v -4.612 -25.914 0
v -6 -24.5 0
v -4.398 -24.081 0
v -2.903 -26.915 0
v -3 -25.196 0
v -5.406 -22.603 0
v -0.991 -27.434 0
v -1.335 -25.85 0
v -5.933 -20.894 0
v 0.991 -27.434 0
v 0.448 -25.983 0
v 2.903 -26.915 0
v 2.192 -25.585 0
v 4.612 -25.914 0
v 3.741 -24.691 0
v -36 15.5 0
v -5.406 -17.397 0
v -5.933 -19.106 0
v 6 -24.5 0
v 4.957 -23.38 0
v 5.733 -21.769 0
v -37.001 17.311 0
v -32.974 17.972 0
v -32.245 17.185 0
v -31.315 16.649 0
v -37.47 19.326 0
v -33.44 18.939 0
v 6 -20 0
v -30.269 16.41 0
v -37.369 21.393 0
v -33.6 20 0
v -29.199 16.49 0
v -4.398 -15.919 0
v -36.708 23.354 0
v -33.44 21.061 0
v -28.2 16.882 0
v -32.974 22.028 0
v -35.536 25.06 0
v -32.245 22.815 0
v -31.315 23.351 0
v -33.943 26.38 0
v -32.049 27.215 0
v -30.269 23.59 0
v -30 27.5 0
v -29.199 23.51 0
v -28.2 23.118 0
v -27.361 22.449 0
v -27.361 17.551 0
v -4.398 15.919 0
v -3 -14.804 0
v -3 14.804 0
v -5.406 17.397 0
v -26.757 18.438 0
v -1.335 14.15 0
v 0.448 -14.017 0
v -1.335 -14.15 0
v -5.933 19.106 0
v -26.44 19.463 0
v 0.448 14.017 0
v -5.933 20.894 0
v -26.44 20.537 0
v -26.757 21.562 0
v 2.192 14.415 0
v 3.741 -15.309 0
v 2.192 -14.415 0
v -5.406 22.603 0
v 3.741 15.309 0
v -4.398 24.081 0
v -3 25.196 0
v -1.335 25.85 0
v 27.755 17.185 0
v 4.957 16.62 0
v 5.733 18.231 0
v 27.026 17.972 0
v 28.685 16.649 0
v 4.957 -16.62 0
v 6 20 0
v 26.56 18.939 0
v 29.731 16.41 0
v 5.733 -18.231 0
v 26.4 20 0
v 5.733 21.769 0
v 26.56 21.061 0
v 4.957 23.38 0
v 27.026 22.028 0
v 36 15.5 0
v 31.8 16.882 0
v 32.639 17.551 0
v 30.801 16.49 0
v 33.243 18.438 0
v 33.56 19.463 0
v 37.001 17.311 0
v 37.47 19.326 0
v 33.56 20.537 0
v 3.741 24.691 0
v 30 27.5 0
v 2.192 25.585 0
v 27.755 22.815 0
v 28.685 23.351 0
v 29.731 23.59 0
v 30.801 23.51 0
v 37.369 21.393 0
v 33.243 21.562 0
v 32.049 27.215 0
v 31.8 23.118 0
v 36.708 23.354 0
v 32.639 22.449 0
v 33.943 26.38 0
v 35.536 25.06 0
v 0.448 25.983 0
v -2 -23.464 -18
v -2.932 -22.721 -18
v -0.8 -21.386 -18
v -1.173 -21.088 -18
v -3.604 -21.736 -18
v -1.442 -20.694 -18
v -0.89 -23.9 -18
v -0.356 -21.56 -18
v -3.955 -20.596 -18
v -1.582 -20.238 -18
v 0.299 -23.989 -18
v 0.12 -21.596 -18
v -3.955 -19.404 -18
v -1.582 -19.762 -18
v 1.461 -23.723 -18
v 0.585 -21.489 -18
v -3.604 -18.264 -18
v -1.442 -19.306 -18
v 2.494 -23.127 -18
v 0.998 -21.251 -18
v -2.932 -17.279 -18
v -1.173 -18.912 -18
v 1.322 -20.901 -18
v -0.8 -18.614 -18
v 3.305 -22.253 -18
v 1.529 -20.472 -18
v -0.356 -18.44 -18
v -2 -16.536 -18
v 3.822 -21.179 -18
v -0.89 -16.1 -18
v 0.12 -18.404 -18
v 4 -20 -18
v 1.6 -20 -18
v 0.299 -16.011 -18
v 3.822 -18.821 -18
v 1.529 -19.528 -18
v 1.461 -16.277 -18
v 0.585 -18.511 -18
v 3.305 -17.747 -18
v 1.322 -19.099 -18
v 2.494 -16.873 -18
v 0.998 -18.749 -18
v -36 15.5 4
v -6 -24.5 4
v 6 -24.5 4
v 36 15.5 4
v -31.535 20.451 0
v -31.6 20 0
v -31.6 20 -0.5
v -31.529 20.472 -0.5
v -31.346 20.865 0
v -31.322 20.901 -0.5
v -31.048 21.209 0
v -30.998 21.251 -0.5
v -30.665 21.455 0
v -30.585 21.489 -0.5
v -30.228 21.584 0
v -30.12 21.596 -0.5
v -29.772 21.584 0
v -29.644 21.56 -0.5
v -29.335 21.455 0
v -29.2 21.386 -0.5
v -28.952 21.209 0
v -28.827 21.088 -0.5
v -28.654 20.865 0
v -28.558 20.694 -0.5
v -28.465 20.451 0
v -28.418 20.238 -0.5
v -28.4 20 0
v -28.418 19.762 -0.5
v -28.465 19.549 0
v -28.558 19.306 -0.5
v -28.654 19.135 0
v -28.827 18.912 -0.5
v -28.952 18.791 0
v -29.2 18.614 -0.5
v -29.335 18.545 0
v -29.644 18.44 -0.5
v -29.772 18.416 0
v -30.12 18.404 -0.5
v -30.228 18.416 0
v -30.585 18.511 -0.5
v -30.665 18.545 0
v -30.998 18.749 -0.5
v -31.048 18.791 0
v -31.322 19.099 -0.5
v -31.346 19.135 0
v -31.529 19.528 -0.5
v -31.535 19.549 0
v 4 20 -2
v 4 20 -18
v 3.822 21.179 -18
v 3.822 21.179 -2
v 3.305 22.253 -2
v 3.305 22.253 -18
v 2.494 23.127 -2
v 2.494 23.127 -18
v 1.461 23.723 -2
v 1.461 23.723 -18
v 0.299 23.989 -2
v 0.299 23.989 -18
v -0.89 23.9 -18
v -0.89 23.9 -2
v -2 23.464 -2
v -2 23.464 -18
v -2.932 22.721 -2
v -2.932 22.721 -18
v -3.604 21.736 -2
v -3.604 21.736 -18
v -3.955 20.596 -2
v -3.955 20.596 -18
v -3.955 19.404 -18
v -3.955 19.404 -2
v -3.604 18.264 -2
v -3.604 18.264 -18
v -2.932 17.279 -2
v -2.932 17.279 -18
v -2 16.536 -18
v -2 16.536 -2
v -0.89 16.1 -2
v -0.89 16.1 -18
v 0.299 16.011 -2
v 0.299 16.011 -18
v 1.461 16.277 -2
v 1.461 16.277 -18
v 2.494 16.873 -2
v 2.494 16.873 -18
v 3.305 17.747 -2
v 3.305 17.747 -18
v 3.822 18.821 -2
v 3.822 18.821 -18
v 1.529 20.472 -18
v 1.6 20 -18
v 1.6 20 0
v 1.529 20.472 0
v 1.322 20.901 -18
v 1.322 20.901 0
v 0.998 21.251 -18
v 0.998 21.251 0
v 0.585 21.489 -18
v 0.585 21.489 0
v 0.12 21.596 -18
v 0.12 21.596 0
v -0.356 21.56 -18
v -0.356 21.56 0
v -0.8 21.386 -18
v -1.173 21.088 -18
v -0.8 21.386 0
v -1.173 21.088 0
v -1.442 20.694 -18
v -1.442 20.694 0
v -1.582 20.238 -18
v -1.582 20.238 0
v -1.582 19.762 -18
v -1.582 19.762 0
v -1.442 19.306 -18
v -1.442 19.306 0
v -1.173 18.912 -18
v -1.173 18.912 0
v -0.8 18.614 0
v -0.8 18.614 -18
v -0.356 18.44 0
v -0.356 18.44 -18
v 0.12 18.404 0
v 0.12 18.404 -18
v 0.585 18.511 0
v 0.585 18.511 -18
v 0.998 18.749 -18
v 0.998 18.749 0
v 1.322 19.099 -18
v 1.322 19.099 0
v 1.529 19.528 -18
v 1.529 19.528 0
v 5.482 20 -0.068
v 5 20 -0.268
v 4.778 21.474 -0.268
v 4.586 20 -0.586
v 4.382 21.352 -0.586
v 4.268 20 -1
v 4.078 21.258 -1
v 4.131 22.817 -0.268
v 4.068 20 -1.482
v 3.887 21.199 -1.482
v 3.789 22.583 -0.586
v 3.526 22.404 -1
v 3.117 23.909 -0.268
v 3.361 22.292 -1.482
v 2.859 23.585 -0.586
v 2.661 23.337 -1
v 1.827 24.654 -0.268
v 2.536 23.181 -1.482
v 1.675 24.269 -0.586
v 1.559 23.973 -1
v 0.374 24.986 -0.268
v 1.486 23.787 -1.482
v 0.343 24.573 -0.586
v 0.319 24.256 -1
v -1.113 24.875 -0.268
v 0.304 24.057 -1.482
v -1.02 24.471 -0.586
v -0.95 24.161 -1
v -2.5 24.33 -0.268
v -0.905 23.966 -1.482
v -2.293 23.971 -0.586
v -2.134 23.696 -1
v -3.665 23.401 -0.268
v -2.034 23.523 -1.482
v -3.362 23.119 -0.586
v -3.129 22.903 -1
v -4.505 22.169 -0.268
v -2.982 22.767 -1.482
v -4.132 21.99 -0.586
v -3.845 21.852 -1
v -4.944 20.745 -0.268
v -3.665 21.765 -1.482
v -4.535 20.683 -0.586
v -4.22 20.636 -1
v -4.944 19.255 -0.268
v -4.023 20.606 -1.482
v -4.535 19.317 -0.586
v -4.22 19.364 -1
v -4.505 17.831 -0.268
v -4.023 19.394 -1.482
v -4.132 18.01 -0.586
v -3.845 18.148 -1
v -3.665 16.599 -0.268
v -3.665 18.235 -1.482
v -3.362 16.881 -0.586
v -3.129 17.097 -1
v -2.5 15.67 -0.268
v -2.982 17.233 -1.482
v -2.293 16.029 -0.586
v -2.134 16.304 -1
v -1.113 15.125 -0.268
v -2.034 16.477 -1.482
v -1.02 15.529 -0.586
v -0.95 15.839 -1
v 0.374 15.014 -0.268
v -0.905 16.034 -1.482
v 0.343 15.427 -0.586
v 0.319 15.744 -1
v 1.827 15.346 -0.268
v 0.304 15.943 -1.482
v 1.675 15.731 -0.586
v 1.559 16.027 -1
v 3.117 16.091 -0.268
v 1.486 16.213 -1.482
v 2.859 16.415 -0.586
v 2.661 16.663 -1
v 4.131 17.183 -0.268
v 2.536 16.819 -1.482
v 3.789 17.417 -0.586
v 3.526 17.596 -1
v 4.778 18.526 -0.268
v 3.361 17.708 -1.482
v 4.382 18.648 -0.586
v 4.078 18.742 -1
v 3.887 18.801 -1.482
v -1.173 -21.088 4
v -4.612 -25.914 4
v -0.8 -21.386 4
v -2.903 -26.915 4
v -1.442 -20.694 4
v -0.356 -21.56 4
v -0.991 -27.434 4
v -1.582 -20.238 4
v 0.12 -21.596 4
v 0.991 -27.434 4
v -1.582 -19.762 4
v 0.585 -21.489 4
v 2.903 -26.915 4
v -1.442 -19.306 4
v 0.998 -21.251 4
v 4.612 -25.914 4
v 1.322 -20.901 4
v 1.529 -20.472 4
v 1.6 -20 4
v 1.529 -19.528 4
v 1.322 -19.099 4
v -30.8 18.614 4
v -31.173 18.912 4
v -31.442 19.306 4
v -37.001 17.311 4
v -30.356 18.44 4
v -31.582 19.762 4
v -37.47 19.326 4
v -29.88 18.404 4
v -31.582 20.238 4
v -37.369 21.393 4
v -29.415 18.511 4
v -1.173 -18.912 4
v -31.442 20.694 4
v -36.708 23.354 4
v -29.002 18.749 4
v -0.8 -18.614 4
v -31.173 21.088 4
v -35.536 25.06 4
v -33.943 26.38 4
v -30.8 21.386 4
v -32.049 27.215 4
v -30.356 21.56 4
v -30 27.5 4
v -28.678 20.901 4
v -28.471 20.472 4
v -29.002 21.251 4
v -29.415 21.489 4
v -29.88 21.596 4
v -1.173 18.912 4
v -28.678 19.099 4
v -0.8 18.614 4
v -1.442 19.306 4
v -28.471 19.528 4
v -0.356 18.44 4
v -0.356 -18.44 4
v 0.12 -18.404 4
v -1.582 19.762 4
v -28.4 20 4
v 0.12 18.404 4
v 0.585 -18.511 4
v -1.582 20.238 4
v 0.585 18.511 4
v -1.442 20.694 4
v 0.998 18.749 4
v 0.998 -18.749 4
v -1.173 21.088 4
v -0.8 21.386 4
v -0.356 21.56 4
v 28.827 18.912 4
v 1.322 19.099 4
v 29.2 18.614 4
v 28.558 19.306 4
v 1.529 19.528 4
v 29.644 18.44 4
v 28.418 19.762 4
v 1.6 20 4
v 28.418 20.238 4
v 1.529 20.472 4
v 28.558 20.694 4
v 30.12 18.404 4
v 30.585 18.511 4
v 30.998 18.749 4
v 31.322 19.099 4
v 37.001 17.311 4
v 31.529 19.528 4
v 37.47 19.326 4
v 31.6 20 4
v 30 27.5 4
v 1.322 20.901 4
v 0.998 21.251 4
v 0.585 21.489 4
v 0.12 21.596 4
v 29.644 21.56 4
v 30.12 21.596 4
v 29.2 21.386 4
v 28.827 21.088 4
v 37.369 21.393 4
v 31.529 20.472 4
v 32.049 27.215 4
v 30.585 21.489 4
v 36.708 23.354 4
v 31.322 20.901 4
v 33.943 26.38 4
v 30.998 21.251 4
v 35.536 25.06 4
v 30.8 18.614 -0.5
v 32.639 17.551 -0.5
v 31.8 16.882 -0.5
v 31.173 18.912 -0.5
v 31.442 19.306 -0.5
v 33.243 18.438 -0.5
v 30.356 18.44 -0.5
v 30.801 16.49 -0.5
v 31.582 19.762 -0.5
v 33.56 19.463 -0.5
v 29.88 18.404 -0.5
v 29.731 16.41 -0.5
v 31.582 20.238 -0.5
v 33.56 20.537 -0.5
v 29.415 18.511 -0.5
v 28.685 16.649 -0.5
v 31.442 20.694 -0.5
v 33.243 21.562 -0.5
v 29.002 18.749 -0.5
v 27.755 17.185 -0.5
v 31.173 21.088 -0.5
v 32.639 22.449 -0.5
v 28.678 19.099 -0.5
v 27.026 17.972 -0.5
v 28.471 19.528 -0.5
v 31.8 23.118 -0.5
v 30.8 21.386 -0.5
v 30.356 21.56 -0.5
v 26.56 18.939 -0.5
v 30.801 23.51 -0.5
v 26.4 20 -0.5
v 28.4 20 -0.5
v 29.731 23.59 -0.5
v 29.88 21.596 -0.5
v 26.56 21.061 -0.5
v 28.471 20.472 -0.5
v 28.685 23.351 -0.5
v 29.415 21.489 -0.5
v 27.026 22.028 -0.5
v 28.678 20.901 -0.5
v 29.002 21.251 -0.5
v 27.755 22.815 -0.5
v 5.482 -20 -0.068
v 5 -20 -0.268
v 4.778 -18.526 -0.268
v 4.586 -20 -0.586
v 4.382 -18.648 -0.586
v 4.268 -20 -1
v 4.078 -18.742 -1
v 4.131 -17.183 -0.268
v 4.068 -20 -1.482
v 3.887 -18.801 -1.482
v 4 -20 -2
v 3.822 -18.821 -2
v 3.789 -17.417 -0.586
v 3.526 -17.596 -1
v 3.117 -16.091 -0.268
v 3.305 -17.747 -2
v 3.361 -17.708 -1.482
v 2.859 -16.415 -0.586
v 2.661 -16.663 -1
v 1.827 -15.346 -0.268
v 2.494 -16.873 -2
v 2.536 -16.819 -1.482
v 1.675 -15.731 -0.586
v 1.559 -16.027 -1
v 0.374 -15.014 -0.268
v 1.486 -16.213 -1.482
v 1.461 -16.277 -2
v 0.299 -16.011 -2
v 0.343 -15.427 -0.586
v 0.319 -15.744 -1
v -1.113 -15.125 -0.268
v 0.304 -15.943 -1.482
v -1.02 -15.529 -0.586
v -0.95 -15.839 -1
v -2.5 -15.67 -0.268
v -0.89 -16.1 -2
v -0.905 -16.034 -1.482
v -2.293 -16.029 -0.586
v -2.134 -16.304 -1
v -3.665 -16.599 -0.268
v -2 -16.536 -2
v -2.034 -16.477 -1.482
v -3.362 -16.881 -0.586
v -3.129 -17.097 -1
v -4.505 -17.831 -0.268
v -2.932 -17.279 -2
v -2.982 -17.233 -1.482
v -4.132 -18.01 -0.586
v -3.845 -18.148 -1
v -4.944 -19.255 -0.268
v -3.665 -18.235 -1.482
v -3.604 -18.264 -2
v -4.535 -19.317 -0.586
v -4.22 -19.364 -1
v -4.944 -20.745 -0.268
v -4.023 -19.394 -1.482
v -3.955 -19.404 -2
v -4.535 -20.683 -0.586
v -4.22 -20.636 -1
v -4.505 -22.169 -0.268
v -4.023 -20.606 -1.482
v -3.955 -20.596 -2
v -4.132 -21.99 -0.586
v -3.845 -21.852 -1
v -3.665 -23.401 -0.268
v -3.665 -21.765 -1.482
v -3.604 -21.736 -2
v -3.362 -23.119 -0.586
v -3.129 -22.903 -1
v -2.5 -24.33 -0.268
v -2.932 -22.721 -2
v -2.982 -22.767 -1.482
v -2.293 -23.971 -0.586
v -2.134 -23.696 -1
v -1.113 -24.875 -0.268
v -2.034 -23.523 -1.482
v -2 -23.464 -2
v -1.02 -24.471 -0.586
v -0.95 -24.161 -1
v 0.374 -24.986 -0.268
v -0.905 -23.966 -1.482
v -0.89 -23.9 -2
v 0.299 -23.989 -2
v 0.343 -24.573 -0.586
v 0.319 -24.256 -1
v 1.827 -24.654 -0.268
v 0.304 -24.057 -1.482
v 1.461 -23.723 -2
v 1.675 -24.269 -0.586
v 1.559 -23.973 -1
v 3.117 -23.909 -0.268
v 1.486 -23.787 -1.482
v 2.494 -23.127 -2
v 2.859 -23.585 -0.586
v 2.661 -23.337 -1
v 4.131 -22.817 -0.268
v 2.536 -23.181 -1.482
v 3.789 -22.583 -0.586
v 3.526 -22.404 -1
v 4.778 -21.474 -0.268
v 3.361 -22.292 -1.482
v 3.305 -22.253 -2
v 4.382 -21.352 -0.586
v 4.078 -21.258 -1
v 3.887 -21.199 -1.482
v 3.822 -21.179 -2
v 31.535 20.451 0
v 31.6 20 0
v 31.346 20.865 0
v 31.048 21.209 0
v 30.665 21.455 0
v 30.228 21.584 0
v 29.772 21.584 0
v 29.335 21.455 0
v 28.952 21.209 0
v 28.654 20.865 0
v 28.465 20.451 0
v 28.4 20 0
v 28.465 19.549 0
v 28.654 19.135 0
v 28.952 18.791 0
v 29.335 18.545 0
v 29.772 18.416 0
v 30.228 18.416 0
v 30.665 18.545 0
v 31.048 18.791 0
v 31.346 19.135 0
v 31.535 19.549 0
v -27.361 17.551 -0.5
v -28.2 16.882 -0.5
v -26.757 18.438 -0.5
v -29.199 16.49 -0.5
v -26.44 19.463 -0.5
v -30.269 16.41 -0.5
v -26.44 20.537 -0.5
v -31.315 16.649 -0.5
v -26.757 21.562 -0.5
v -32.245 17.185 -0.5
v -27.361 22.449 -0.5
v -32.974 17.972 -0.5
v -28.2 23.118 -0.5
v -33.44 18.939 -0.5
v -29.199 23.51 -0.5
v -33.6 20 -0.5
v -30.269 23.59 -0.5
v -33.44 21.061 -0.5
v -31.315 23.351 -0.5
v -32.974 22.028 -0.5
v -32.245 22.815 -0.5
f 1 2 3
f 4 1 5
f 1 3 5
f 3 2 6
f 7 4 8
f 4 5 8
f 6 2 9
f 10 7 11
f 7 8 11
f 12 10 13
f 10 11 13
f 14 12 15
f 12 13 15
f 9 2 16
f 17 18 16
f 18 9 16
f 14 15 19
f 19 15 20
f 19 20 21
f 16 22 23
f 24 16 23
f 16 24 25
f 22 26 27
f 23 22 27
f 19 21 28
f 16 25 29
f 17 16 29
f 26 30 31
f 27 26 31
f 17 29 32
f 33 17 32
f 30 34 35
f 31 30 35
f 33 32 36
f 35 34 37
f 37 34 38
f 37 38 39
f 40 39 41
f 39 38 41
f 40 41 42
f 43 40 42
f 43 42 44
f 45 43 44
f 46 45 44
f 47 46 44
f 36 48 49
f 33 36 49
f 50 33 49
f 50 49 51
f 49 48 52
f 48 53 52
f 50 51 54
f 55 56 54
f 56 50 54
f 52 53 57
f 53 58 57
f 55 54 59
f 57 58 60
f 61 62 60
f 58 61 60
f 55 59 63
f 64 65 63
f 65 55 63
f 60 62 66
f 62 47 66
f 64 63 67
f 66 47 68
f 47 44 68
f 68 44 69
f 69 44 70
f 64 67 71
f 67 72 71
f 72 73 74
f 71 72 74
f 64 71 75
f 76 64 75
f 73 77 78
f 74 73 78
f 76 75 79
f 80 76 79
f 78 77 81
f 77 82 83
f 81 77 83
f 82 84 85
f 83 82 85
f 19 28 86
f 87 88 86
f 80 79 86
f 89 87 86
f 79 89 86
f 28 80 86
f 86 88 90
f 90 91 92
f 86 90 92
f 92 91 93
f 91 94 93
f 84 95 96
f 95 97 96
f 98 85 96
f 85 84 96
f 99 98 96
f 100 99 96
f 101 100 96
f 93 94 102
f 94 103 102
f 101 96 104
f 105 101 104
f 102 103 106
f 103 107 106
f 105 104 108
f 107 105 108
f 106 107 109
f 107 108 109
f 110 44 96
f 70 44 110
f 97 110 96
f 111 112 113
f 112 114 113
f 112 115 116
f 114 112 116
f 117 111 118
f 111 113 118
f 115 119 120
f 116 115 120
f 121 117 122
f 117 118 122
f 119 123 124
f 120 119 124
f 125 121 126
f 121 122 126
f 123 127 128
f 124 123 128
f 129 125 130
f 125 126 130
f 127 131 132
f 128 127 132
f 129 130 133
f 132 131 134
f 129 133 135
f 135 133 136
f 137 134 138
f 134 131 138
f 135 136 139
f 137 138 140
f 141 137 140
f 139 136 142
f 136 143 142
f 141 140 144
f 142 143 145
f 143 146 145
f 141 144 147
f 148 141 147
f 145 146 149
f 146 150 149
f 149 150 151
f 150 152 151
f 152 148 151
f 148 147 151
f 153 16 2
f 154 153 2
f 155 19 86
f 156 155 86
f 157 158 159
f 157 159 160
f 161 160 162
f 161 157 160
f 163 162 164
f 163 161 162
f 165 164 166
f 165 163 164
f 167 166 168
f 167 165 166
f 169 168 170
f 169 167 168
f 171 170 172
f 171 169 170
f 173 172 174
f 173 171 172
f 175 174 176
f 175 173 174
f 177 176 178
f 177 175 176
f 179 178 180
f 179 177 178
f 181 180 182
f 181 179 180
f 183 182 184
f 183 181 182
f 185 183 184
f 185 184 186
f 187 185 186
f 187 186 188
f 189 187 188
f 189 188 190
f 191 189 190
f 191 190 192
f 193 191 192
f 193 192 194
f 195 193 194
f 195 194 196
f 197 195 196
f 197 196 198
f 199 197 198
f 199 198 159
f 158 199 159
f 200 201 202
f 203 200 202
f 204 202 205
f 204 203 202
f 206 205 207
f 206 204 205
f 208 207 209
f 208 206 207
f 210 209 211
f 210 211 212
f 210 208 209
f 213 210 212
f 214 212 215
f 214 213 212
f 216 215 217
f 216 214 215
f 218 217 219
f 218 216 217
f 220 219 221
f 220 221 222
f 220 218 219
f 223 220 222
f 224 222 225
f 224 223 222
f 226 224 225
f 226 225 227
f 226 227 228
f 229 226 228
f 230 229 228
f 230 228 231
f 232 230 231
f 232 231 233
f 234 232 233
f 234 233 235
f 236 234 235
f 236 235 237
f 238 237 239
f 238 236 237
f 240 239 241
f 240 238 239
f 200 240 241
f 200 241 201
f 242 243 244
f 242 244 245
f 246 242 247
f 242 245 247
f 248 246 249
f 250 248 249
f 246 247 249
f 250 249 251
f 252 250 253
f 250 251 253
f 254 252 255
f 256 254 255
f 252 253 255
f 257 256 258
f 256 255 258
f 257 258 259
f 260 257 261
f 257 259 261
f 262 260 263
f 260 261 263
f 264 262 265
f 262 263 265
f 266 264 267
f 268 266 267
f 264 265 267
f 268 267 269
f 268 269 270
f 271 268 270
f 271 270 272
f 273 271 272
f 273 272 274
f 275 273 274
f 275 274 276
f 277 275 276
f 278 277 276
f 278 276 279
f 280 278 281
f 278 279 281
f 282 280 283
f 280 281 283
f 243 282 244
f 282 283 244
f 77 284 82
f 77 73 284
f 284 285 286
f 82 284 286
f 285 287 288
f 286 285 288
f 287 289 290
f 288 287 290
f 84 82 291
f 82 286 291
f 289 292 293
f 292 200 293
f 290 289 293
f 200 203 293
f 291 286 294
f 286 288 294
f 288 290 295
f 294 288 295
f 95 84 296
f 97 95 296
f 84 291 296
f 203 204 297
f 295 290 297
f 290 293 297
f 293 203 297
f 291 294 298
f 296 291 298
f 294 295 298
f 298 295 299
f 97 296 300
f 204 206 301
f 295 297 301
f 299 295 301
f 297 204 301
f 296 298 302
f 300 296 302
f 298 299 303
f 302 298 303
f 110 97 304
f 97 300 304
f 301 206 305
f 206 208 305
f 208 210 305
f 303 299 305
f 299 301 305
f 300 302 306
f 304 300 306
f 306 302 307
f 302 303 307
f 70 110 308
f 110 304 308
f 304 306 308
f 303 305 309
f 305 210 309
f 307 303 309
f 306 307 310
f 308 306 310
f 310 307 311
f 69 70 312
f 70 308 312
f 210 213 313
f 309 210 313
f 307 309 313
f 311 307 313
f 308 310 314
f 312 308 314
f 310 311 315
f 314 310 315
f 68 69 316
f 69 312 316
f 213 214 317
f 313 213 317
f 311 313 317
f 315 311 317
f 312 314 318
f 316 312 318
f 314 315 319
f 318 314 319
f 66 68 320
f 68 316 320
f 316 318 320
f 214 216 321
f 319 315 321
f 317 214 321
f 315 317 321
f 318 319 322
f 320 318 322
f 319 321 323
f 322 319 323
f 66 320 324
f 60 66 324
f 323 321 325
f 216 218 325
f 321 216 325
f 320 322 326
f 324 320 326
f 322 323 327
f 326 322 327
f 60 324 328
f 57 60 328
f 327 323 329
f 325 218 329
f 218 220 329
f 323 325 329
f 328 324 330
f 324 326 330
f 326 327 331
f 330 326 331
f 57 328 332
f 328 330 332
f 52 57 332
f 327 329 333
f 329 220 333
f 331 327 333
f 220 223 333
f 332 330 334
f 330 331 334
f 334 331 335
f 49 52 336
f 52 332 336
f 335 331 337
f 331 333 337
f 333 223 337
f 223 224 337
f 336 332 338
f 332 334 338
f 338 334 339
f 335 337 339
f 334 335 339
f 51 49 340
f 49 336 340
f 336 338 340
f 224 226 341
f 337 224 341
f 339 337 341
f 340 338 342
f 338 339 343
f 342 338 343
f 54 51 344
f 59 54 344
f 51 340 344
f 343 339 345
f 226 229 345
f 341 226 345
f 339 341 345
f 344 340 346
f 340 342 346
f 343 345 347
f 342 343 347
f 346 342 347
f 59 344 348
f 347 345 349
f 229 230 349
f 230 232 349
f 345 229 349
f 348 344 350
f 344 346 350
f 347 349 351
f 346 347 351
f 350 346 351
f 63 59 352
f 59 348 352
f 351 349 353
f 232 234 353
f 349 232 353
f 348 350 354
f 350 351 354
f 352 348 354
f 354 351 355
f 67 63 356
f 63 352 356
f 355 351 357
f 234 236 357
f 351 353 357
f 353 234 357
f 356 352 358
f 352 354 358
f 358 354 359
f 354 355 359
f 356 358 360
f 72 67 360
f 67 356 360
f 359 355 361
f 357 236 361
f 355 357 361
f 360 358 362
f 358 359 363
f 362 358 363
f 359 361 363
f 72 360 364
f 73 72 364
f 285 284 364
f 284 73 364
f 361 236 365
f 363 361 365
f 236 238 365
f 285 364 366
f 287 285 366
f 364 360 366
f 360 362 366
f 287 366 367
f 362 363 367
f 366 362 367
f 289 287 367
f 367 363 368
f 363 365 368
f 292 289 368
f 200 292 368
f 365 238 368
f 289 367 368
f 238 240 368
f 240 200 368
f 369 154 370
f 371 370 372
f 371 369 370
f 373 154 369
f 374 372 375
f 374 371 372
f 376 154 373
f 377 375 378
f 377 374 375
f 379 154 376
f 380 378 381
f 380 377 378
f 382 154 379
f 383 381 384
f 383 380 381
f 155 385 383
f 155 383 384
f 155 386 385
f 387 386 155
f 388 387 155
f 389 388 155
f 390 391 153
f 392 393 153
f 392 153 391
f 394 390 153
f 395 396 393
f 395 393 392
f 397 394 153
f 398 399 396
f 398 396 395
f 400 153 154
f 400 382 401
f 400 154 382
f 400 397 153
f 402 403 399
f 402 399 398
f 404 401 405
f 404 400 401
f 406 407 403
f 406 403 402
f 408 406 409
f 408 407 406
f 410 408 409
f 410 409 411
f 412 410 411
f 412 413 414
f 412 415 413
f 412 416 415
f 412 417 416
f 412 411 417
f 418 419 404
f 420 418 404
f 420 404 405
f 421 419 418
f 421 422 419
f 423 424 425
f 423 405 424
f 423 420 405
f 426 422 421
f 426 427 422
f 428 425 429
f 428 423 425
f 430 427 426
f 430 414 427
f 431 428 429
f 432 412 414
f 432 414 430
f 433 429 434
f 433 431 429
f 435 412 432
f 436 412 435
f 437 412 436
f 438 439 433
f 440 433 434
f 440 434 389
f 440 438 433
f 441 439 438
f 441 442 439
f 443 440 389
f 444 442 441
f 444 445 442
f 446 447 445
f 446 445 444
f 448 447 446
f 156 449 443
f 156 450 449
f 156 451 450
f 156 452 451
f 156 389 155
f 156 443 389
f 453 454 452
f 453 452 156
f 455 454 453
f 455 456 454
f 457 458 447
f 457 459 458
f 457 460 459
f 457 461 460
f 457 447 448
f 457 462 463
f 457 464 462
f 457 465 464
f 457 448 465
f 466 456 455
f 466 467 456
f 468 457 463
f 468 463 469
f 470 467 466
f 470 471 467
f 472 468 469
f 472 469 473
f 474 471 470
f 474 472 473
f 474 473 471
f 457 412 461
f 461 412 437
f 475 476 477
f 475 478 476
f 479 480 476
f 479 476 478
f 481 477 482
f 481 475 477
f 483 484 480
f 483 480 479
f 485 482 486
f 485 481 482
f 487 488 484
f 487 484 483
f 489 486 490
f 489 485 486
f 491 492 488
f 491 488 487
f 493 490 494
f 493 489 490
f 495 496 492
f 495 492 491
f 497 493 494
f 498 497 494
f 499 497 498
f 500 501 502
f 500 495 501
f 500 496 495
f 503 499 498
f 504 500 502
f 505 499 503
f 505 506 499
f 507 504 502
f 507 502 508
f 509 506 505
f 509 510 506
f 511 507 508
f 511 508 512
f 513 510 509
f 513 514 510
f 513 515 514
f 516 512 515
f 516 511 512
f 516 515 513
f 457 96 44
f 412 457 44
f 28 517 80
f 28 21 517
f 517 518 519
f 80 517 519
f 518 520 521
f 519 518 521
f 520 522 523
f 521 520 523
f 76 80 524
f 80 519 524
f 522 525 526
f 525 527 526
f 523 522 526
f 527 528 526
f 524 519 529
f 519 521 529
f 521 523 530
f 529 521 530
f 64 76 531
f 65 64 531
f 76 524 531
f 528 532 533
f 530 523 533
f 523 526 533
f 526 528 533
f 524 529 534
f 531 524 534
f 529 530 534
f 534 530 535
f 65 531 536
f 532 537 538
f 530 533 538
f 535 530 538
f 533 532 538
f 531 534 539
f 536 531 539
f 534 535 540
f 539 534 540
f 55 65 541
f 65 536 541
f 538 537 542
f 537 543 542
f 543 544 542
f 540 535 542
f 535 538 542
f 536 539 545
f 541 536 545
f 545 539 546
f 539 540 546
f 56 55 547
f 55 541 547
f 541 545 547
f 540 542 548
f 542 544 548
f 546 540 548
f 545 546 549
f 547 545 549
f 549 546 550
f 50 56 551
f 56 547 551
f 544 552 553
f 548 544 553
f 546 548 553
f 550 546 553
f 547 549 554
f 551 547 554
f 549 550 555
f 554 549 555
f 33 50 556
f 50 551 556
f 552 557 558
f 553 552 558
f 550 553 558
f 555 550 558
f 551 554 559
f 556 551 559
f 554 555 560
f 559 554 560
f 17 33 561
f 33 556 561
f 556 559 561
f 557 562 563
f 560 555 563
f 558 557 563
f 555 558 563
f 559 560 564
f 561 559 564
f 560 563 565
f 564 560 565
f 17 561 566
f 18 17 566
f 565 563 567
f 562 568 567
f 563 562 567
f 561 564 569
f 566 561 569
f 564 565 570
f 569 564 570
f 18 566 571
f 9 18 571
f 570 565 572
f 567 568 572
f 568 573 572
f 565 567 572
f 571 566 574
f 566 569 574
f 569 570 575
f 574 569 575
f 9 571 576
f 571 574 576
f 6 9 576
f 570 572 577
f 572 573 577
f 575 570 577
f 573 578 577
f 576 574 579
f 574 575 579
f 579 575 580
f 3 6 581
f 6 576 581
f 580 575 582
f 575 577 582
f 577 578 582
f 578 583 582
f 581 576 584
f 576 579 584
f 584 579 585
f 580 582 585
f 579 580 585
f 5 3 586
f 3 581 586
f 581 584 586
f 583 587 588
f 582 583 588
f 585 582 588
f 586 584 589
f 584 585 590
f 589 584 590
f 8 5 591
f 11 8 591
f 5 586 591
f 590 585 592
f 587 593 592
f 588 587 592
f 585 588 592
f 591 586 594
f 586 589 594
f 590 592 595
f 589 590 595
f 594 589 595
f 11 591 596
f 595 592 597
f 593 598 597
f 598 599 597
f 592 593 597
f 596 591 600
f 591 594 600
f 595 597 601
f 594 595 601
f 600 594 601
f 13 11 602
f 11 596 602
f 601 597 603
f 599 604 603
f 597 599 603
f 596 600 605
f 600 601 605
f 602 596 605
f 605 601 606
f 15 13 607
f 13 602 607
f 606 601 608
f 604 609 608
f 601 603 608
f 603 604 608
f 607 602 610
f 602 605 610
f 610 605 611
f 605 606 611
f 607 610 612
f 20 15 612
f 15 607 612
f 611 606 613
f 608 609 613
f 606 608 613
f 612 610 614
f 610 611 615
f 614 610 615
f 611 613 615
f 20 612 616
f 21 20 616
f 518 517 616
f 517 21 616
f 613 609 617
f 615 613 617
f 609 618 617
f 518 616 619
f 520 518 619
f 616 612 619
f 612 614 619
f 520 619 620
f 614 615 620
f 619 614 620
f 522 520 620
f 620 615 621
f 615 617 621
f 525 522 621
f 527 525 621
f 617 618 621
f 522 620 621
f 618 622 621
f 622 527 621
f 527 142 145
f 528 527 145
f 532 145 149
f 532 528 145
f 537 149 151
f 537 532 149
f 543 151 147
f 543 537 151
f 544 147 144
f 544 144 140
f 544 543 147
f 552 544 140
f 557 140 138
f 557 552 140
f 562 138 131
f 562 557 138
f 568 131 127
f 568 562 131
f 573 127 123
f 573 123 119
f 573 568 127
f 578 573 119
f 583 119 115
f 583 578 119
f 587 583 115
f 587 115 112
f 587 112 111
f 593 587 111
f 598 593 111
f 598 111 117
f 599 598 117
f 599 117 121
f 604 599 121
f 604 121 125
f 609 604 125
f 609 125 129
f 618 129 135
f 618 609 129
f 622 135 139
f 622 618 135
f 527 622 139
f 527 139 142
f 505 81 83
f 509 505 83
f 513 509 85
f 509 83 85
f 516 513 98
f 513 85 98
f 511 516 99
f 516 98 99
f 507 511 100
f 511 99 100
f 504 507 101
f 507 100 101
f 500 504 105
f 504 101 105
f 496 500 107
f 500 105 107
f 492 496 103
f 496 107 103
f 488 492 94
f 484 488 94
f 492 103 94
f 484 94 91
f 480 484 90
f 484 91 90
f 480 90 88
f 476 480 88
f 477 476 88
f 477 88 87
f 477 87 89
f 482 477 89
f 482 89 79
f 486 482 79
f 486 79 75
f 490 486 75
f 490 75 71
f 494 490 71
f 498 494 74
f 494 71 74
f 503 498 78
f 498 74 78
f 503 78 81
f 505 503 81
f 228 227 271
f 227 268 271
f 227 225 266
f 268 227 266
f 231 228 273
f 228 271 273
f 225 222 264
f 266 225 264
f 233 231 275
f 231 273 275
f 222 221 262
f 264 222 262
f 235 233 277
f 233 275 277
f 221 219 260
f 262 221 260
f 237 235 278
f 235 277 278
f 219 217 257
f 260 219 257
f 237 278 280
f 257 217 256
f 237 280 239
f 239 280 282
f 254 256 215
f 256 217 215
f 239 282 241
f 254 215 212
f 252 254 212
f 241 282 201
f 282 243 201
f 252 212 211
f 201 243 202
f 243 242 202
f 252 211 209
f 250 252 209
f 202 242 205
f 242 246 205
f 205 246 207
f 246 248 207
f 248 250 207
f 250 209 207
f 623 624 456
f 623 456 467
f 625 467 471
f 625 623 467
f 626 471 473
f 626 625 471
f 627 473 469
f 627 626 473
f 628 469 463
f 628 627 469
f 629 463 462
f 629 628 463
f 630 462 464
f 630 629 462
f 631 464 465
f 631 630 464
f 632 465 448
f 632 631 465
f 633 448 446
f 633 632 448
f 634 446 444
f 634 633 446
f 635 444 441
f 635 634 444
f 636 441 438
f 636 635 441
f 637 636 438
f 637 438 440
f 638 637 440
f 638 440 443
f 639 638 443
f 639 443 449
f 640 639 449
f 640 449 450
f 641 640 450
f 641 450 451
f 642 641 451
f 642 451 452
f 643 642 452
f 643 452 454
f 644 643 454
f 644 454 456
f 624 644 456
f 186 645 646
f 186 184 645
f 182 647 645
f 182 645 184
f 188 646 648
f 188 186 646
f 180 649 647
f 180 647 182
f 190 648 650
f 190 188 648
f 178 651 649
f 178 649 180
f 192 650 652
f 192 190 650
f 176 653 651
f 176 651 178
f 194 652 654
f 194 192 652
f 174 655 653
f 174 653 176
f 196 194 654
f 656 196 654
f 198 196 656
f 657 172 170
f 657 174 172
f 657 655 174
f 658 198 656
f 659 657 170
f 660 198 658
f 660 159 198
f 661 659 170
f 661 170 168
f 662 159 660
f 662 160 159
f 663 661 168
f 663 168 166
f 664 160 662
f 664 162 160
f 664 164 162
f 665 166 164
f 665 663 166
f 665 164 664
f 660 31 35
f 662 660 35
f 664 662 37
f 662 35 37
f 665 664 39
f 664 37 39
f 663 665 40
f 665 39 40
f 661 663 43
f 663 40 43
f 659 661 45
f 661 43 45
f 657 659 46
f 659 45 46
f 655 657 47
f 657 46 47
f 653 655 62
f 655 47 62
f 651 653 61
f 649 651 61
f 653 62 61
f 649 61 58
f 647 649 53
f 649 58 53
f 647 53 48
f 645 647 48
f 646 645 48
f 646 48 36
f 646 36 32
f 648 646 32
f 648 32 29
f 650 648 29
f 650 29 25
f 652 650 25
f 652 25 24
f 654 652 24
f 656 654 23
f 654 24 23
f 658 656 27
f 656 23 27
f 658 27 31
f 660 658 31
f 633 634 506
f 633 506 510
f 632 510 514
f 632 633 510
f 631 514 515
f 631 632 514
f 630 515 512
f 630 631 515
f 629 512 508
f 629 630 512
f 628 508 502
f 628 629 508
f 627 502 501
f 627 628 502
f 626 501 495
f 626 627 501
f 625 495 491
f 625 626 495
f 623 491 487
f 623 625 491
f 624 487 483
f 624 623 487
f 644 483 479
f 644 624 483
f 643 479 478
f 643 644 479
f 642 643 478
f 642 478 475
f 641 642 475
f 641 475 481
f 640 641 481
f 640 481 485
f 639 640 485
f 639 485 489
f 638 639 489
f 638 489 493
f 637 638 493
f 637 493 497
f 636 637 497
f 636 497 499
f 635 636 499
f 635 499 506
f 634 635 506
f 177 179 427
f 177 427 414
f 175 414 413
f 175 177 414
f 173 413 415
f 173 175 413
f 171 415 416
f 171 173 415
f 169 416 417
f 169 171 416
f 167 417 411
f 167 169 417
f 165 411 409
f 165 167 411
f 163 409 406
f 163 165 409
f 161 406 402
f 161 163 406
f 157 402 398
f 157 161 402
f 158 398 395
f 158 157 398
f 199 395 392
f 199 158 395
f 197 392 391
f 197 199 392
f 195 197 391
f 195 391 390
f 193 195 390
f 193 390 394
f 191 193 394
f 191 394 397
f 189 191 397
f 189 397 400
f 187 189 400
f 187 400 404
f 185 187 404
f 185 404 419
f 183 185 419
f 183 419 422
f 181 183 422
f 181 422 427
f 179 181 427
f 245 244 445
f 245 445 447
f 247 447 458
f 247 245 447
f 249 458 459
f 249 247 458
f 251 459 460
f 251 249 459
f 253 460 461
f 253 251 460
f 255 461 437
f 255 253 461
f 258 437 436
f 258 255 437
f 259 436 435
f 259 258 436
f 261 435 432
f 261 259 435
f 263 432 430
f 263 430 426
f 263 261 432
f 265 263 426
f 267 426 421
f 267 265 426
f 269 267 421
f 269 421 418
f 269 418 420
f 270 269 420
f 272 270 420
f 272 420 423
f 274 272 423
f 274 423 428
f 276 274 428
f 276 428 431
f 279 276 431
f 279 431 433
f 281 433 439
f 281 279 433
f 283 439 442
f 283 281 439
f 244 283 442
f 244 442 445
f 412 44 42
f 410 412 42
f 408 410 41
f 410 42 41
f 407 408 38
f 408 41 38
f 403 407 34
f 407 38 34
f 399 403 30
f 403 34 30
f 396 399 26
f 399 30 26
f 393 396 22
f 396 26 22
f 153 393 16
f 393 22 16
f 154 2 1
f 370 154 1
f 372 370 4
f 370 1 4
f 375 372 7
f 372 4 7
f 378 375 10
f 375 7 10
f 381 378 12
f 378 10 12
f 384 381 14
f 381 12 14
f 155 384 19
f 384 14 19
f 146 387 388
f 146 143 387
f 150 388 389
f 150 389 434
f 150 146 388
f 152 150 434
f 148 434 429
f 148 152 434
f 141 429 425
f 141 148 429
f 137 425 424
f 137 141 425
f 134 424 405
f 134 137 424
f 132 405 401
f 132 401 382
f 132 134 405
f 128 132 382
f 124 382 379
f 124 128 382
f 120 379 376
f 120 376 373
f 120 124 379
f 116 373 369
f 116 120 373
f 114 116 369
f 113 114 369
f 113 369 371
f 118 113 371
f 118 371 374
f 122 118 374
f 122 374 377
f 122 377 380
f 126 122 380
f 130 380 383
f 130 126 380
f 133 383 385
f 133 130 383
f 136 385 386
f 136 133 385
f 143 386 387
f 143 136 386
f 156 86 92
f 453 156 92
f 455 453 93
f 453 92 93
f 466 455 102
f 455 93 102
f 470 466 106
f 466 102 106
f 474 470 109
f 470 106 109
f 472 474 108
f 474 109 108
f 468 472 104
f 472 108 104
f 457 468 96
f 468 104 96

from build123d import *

# Parameters (mm, degrees)
SKETCH1_R           = 1.6
BOSS_EXTRUDE1_DEPTH = 4
SKETCH1_4_R         = 4
SKETCH1_4_R_2       = 1.6
BOSS_EXTRUDE2_DEPTH = 18
SKETCH3_R           = 3.6
SKETCH3_R_2         = 1.6
BOSS_EXTRUDE3_DEPTH = 0.5
FILLET1_R           = 2


with BuildPart() as part:
    # Sketch1 → Boss-Extrude1 (new body)
    with BuildSketch(Plane.XY):
        with BuildLine():
            Line((-36, 15.5), (-6, -24.5))
            ThreePointArc((-6, -24.5), (0, -27.5), (6, -24.5))
            Line((6, -24.5), (36, 15.5))
            ThreePointArc((36, 15.5), (36.708203932, 23.354101966), (30, 27.5))
            Line((30, 27.5), (-30, 27.5))
            ThreePointArc((-30, 27.5), (-36.708203932, 23.354101966), (-36, 15.5))
        make_face()
        with Locations((-30, 20)):
            Circle(SKETCH1_R, mode=Mode.SUBTRACT)
        with Locations((30, 20)):
            Circle(SKETCH1_R, mode=Mode.SUBTRACT)
        with Locations((0, 20)):
            Circle(SKETCH1_R, mode=Mode.SUBTRACT)
        with Locations((0, -20)):
            Circle(SKETCH1_R, mode=Mode.SUBTRACT)
    extrude(amount=BOSS_EXTRUDE1_DEPTH)

    # Sketch1<4> → Boss-Extrude2 (add)
    with BuildSketch(Plane.XY):
        with Locations((0, 20)):
            Circle(SKETCH1_4_R)
        with Locations((0, 20)):
            Circle(SKETCH1_4_R_2, mode=Mode.SUBTRACT)
        with Locations((0, -20)):
            Circle(SKETCH1_4_R)
        with Locations((0, -20)):
            Circle(SKETCH1_4_R_2, mode=Mode.SUBTRACT)
    extrude(amount=-BOSS_EXTRUDE2_DEPTH)

    # Sketch3 → Boss-Extrude3 (add)
    with BuildSketch(Plane(origin=(0, 0, 0), x_dir=(-1, 0, 0), z_dir=(0, 0, -1))):
        with Locations((-30, 20)):
            Circle(SKETCH3_R)
        with Locations((-30, 20)):
            Circle(SKETCH3_R_2, mode=Mode.SUBTRACT)
        with Locations((30, 20)):
            Circle(SKETCH3_R)
        with Locations((30, 20)):
            Circle(SKETCH3_R_2, mode=Mode.SUBTRACT)
    extrude(amount=BOSS_EXTRUDE3_DEPTH)

    # Fillet1
    fillet1_edges = [part.edges().sort_by_distance(p)[0] for p in [
        (-4, 20, 0),
        (-4, -20, 0),
    ]]
    fillet(fillet1_edges, radius=FILLET1_R)


solid = part.part
